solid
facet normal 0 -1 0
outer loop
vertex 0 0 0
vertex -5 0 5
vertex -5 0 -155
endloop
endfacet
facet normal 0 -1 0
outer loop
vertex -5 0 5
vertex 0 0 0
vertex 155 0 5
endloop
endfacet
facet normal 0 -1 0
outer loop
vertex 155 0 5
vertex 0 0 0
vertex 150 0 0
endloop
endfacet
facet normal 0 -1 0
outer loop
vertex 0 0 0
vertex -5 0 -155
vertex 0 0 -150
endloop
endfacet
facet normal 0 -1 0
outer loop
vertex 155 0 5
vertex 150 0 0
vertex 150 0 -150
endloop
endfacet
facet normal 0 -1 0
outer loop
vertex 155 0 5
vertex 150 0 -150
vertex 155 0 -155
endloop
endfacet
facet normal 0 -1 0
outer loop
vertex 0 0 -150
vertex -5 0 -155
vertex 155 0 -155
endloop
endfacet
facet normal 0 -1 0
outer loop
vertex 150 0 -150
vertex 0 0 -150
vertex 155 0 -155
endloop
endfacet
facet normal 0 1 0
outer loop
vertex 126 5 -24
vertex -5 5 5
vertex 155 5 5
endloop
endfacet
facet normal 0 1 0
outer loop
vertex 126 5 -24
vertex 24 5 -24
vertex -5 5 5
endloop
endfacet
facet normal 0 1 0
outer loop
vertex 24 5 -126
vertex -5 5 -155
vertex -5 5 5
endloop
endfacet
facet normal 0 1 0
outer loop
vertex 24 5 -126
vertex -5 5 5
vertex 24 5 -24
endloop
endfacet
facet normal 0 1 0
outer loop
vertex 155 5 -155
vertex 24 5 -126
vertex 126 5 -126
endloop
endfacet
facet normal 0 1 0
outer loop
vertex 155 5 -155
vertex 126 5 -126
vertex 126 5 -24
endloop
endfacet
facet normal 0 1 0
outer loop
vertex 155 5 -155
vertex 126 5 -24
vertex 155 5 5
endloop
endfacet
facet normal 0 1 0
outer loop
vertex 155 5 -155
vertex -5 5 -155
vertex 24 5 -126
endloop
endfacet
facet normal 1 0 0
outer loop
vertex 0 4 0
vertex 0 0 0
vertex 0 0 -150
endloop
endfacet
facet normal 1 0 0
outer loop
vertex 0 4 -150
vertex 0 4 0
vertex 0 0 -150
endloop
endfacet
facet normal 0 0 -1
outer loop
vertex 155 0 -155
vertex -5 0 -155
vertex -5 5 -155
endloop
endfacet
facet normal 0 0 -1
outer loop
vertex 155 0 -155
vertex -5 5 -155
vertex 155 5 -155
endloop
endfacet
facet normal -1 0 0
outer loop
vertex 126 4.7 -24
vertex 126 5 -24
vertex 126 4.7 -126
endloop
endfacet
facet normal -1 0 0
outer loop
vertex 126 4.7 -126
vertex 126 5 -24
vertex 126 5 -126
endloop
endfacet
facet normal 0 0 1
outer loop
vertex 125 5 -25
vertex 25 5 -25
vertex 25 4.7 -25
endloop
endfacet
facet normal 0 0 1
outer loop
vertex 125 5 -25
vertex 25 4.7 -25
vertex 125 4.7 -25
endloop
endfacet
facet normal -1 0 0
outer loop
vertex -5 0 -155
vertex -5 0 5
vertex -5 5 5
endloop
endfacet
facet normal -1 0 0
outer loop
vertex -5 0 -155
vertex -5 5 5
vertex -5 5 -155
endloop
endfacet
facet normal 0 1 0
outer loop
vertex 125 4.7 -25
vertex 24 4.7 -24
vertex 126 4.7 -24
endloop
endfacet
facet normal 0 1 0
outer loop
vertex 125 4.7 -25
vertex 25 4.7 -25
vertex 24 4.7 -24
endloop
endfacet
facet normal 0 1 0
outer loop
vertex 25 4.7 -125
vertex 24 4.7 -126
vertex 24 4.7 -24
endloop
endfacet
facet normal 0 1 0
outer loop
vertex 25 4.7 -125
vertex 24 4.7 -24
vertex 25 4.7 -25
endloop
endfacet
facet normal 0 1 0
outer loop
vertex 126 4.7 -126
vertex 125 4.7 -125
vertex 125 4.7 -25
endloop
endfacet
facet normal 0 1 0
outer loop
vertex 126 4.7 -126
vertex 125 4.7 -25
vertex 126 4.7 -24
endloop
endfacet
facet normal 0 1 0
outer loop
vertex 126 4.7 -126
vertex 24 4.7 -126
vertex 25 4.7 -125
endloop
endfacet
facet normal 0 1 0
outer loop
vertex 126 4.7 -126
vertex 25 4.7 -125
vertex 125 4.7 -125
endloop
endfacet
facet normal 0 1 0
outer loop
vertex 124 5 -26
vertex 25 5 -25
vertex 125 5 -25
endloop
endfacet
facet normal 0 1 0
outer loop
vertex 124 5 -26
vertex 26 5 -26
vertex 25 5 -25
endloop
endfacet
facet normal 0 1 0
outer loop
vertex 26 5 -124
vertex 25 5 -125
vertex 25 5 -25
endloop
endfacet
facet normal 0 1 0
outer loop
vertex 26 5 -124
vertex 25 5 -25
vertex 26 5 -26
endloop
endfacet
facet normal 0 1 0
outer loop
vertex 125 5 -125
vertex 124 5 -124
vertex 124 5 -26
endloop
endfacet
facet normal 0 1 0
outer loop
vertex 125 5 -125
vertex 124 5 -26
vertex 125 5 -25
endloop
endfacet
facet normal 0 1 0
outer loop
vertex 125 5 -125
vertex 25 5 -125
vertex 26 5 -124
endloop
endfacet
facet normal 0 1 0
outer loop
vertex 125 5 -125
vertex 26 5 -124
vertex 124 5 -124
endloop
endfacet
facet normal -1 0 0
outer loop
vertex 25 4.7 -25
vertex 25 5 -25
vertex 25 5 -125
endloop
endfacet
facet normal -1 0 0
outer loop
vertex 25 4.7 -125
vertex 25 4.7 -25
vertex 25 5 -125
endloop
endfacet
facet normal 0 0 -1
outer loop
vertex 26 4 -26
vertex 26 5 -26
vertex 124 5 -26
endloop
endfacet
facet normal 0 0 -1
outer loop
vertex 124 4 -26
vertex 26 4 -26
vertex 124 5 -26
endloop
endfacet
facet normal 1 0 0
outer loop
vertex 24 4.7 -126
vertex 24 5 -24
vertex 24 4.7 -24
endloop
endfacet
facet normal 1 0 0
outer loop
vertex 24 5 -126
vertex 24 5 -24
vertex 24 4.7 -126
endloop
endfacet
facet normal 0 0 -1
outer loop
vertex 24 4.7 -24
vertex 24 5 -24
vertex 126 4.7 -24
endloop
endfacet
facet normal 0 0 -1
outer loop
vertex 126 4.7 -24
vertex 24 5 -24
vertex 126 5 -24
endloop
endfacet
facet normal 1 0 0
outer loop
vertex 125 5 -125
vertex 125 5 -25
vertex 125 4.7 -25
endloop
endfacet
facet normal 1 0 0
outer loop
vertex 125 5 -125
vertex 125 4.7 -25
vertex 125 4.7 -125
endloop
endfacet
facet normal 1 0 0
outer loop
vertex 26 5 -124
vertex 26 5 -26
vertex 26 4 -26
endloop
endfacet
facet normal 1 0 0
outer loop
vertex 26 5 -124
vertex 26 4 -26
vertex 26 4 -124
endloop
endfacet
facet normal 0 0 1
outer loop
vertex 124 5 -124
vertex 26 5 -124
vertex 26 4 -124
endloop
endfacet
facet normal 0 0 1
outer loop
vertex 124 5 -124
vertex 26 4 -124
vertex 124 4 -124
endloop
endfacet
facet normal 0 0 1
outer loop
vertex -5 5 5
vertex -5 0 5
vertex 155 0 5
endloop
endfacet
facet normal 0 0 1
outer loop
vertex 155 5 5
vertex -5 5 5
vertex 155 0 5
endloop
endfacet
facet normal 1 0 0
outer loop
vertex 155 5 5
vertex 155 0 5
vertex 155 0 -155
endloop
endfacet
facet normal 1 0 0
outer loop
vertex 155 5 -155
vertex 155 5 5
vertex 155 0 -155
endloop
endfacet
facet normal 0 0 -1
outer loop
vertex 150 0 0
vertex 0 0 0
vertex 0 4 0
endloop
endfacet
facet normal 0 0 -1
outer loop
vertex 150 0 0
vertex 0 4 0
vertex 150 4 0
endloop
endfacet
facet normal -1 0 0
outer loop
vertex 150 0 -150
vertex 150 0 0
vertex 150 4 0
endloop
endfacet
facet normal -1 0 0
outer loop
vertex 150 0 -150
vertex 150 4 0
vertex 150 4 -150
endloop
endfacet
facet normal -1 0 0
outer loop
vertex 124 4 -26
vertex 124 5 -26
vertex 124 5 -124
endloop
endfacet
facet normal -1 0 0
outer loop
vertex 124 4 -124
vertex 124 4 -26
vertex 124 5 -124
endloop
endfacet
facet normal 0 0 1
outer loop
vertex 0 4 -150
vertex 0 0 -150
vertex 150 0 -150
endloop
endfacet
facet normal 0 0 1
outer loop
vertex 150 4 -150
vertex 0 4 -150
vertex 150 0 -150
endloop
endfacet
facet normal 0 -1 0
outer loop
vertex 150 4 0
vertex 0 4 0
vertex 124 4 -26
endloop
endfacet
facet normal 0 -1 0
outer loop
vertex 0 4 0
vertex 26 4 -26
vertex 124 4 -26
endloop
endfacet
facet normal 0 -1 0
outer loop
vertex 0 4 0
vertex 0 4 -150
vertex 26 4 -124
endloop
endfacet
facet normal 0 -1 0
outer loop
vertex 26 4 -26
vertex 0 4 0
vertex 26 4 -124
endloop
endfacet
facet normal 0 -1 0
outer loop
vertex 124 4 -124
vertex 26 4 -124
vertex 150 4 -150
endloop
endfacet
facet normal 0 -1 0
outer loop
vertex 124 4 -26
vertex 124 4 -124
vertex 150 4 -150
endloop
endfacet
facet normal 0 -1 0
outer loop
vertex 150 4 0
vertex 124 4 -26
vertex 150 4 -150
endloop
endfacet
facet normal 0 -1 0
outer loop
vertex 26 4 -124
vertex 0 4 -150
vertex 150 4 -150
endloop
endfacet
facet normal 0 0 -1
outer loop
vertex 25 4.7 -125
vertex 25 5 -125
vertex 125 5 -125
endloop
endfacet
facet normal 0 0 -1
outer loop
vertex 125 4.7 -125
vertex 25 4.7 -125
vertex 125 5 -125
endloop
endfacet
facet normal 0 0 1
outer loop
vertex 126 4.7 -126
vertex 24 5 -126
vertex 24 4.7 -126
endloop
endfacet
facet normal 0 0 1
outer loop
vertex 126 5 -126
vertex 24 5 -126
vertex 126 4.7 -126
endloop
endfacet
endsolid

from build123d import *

# Parameters (mm, degrees)
CROQUIS1_W              = 160
CROQUIS1_H              = 160
CROQUIS1_W_2            = 150
CROQUIS1_H_2            = 150
SALIENTE_EXTRUIR1_DEPTH = 5
CROQUIS2_W              = 150
CROQUIS2_H              = 150
CROQUIS2_W_2            = 98
CROQUIS2_H_2            = 98
SALIENTE_EXTRUIR2_DEPTH = 1
CROQUIS3_W              = 102
CROQUIS3_H              = 102
CROQUIS3_W_2            = 100
CROQUIS3_H_2            = 100
CORTAR_EXTRUIR1_DEPTH   = 0.3


with BuildPart() as part:
    # Croquis1 → Saliente-Extruir1 (new body)
    with BuildSketch(Plane(origin=(0, 0, 0), x_dir=(1, 0, 0), z_dir=(0, 1, 0))):
        with Locations((75, 75)):
            Rectangle(CROQUIS1_W, CROQUIS1_H)
        with Locations((75, 75)):
            Rectangle(CROQUIS1_W_2, CROQUIS1_H_2, mode=Mode.SUBTRACT)
    extrude(amount=SALIENTE_EXTRUIR1_DEPTH)

    # Croquis2 → Saliente-Extruir2 (add)
    with BuildSketch(Plane(origin=(0, 5, 0), x_dir=(1, 0, 0), z_dir=(0, 1, 0))):
        with Locations((75, 75)):
            Rectangle(CROQUIS2_W, CROQUIS2_H)
        with Locations((75, 75)):
            Rectangle(CROQUIS2_W_2, CROQUIS2_H_2, mode=Mode.SUBTRACT)
    extrude(amount=-SALIENTE_EXTRUIR2_DEPTH)

    # Croquis3 → Cortar-Extruir1 (cut)
    with BuildSketch(Plane(origin=(0, 5, 0), x_dir=(1, 0, 0), z_dir=(0, 1, 0))):
        with Locations((75, 75)):
            Rectangle(CROQUIS3_W, CROQUIS3_H)
        with Locations((75, 75)):
            Rectangle(CROQUIS3_W_2, CROQUIS3_H_2, mode=Mode.SUBTRACT)
    extrude(amount=-CORTAR_EXTRUIR1_DEPTH, mode=Mode.SUBTRACT)


solid = part.part
